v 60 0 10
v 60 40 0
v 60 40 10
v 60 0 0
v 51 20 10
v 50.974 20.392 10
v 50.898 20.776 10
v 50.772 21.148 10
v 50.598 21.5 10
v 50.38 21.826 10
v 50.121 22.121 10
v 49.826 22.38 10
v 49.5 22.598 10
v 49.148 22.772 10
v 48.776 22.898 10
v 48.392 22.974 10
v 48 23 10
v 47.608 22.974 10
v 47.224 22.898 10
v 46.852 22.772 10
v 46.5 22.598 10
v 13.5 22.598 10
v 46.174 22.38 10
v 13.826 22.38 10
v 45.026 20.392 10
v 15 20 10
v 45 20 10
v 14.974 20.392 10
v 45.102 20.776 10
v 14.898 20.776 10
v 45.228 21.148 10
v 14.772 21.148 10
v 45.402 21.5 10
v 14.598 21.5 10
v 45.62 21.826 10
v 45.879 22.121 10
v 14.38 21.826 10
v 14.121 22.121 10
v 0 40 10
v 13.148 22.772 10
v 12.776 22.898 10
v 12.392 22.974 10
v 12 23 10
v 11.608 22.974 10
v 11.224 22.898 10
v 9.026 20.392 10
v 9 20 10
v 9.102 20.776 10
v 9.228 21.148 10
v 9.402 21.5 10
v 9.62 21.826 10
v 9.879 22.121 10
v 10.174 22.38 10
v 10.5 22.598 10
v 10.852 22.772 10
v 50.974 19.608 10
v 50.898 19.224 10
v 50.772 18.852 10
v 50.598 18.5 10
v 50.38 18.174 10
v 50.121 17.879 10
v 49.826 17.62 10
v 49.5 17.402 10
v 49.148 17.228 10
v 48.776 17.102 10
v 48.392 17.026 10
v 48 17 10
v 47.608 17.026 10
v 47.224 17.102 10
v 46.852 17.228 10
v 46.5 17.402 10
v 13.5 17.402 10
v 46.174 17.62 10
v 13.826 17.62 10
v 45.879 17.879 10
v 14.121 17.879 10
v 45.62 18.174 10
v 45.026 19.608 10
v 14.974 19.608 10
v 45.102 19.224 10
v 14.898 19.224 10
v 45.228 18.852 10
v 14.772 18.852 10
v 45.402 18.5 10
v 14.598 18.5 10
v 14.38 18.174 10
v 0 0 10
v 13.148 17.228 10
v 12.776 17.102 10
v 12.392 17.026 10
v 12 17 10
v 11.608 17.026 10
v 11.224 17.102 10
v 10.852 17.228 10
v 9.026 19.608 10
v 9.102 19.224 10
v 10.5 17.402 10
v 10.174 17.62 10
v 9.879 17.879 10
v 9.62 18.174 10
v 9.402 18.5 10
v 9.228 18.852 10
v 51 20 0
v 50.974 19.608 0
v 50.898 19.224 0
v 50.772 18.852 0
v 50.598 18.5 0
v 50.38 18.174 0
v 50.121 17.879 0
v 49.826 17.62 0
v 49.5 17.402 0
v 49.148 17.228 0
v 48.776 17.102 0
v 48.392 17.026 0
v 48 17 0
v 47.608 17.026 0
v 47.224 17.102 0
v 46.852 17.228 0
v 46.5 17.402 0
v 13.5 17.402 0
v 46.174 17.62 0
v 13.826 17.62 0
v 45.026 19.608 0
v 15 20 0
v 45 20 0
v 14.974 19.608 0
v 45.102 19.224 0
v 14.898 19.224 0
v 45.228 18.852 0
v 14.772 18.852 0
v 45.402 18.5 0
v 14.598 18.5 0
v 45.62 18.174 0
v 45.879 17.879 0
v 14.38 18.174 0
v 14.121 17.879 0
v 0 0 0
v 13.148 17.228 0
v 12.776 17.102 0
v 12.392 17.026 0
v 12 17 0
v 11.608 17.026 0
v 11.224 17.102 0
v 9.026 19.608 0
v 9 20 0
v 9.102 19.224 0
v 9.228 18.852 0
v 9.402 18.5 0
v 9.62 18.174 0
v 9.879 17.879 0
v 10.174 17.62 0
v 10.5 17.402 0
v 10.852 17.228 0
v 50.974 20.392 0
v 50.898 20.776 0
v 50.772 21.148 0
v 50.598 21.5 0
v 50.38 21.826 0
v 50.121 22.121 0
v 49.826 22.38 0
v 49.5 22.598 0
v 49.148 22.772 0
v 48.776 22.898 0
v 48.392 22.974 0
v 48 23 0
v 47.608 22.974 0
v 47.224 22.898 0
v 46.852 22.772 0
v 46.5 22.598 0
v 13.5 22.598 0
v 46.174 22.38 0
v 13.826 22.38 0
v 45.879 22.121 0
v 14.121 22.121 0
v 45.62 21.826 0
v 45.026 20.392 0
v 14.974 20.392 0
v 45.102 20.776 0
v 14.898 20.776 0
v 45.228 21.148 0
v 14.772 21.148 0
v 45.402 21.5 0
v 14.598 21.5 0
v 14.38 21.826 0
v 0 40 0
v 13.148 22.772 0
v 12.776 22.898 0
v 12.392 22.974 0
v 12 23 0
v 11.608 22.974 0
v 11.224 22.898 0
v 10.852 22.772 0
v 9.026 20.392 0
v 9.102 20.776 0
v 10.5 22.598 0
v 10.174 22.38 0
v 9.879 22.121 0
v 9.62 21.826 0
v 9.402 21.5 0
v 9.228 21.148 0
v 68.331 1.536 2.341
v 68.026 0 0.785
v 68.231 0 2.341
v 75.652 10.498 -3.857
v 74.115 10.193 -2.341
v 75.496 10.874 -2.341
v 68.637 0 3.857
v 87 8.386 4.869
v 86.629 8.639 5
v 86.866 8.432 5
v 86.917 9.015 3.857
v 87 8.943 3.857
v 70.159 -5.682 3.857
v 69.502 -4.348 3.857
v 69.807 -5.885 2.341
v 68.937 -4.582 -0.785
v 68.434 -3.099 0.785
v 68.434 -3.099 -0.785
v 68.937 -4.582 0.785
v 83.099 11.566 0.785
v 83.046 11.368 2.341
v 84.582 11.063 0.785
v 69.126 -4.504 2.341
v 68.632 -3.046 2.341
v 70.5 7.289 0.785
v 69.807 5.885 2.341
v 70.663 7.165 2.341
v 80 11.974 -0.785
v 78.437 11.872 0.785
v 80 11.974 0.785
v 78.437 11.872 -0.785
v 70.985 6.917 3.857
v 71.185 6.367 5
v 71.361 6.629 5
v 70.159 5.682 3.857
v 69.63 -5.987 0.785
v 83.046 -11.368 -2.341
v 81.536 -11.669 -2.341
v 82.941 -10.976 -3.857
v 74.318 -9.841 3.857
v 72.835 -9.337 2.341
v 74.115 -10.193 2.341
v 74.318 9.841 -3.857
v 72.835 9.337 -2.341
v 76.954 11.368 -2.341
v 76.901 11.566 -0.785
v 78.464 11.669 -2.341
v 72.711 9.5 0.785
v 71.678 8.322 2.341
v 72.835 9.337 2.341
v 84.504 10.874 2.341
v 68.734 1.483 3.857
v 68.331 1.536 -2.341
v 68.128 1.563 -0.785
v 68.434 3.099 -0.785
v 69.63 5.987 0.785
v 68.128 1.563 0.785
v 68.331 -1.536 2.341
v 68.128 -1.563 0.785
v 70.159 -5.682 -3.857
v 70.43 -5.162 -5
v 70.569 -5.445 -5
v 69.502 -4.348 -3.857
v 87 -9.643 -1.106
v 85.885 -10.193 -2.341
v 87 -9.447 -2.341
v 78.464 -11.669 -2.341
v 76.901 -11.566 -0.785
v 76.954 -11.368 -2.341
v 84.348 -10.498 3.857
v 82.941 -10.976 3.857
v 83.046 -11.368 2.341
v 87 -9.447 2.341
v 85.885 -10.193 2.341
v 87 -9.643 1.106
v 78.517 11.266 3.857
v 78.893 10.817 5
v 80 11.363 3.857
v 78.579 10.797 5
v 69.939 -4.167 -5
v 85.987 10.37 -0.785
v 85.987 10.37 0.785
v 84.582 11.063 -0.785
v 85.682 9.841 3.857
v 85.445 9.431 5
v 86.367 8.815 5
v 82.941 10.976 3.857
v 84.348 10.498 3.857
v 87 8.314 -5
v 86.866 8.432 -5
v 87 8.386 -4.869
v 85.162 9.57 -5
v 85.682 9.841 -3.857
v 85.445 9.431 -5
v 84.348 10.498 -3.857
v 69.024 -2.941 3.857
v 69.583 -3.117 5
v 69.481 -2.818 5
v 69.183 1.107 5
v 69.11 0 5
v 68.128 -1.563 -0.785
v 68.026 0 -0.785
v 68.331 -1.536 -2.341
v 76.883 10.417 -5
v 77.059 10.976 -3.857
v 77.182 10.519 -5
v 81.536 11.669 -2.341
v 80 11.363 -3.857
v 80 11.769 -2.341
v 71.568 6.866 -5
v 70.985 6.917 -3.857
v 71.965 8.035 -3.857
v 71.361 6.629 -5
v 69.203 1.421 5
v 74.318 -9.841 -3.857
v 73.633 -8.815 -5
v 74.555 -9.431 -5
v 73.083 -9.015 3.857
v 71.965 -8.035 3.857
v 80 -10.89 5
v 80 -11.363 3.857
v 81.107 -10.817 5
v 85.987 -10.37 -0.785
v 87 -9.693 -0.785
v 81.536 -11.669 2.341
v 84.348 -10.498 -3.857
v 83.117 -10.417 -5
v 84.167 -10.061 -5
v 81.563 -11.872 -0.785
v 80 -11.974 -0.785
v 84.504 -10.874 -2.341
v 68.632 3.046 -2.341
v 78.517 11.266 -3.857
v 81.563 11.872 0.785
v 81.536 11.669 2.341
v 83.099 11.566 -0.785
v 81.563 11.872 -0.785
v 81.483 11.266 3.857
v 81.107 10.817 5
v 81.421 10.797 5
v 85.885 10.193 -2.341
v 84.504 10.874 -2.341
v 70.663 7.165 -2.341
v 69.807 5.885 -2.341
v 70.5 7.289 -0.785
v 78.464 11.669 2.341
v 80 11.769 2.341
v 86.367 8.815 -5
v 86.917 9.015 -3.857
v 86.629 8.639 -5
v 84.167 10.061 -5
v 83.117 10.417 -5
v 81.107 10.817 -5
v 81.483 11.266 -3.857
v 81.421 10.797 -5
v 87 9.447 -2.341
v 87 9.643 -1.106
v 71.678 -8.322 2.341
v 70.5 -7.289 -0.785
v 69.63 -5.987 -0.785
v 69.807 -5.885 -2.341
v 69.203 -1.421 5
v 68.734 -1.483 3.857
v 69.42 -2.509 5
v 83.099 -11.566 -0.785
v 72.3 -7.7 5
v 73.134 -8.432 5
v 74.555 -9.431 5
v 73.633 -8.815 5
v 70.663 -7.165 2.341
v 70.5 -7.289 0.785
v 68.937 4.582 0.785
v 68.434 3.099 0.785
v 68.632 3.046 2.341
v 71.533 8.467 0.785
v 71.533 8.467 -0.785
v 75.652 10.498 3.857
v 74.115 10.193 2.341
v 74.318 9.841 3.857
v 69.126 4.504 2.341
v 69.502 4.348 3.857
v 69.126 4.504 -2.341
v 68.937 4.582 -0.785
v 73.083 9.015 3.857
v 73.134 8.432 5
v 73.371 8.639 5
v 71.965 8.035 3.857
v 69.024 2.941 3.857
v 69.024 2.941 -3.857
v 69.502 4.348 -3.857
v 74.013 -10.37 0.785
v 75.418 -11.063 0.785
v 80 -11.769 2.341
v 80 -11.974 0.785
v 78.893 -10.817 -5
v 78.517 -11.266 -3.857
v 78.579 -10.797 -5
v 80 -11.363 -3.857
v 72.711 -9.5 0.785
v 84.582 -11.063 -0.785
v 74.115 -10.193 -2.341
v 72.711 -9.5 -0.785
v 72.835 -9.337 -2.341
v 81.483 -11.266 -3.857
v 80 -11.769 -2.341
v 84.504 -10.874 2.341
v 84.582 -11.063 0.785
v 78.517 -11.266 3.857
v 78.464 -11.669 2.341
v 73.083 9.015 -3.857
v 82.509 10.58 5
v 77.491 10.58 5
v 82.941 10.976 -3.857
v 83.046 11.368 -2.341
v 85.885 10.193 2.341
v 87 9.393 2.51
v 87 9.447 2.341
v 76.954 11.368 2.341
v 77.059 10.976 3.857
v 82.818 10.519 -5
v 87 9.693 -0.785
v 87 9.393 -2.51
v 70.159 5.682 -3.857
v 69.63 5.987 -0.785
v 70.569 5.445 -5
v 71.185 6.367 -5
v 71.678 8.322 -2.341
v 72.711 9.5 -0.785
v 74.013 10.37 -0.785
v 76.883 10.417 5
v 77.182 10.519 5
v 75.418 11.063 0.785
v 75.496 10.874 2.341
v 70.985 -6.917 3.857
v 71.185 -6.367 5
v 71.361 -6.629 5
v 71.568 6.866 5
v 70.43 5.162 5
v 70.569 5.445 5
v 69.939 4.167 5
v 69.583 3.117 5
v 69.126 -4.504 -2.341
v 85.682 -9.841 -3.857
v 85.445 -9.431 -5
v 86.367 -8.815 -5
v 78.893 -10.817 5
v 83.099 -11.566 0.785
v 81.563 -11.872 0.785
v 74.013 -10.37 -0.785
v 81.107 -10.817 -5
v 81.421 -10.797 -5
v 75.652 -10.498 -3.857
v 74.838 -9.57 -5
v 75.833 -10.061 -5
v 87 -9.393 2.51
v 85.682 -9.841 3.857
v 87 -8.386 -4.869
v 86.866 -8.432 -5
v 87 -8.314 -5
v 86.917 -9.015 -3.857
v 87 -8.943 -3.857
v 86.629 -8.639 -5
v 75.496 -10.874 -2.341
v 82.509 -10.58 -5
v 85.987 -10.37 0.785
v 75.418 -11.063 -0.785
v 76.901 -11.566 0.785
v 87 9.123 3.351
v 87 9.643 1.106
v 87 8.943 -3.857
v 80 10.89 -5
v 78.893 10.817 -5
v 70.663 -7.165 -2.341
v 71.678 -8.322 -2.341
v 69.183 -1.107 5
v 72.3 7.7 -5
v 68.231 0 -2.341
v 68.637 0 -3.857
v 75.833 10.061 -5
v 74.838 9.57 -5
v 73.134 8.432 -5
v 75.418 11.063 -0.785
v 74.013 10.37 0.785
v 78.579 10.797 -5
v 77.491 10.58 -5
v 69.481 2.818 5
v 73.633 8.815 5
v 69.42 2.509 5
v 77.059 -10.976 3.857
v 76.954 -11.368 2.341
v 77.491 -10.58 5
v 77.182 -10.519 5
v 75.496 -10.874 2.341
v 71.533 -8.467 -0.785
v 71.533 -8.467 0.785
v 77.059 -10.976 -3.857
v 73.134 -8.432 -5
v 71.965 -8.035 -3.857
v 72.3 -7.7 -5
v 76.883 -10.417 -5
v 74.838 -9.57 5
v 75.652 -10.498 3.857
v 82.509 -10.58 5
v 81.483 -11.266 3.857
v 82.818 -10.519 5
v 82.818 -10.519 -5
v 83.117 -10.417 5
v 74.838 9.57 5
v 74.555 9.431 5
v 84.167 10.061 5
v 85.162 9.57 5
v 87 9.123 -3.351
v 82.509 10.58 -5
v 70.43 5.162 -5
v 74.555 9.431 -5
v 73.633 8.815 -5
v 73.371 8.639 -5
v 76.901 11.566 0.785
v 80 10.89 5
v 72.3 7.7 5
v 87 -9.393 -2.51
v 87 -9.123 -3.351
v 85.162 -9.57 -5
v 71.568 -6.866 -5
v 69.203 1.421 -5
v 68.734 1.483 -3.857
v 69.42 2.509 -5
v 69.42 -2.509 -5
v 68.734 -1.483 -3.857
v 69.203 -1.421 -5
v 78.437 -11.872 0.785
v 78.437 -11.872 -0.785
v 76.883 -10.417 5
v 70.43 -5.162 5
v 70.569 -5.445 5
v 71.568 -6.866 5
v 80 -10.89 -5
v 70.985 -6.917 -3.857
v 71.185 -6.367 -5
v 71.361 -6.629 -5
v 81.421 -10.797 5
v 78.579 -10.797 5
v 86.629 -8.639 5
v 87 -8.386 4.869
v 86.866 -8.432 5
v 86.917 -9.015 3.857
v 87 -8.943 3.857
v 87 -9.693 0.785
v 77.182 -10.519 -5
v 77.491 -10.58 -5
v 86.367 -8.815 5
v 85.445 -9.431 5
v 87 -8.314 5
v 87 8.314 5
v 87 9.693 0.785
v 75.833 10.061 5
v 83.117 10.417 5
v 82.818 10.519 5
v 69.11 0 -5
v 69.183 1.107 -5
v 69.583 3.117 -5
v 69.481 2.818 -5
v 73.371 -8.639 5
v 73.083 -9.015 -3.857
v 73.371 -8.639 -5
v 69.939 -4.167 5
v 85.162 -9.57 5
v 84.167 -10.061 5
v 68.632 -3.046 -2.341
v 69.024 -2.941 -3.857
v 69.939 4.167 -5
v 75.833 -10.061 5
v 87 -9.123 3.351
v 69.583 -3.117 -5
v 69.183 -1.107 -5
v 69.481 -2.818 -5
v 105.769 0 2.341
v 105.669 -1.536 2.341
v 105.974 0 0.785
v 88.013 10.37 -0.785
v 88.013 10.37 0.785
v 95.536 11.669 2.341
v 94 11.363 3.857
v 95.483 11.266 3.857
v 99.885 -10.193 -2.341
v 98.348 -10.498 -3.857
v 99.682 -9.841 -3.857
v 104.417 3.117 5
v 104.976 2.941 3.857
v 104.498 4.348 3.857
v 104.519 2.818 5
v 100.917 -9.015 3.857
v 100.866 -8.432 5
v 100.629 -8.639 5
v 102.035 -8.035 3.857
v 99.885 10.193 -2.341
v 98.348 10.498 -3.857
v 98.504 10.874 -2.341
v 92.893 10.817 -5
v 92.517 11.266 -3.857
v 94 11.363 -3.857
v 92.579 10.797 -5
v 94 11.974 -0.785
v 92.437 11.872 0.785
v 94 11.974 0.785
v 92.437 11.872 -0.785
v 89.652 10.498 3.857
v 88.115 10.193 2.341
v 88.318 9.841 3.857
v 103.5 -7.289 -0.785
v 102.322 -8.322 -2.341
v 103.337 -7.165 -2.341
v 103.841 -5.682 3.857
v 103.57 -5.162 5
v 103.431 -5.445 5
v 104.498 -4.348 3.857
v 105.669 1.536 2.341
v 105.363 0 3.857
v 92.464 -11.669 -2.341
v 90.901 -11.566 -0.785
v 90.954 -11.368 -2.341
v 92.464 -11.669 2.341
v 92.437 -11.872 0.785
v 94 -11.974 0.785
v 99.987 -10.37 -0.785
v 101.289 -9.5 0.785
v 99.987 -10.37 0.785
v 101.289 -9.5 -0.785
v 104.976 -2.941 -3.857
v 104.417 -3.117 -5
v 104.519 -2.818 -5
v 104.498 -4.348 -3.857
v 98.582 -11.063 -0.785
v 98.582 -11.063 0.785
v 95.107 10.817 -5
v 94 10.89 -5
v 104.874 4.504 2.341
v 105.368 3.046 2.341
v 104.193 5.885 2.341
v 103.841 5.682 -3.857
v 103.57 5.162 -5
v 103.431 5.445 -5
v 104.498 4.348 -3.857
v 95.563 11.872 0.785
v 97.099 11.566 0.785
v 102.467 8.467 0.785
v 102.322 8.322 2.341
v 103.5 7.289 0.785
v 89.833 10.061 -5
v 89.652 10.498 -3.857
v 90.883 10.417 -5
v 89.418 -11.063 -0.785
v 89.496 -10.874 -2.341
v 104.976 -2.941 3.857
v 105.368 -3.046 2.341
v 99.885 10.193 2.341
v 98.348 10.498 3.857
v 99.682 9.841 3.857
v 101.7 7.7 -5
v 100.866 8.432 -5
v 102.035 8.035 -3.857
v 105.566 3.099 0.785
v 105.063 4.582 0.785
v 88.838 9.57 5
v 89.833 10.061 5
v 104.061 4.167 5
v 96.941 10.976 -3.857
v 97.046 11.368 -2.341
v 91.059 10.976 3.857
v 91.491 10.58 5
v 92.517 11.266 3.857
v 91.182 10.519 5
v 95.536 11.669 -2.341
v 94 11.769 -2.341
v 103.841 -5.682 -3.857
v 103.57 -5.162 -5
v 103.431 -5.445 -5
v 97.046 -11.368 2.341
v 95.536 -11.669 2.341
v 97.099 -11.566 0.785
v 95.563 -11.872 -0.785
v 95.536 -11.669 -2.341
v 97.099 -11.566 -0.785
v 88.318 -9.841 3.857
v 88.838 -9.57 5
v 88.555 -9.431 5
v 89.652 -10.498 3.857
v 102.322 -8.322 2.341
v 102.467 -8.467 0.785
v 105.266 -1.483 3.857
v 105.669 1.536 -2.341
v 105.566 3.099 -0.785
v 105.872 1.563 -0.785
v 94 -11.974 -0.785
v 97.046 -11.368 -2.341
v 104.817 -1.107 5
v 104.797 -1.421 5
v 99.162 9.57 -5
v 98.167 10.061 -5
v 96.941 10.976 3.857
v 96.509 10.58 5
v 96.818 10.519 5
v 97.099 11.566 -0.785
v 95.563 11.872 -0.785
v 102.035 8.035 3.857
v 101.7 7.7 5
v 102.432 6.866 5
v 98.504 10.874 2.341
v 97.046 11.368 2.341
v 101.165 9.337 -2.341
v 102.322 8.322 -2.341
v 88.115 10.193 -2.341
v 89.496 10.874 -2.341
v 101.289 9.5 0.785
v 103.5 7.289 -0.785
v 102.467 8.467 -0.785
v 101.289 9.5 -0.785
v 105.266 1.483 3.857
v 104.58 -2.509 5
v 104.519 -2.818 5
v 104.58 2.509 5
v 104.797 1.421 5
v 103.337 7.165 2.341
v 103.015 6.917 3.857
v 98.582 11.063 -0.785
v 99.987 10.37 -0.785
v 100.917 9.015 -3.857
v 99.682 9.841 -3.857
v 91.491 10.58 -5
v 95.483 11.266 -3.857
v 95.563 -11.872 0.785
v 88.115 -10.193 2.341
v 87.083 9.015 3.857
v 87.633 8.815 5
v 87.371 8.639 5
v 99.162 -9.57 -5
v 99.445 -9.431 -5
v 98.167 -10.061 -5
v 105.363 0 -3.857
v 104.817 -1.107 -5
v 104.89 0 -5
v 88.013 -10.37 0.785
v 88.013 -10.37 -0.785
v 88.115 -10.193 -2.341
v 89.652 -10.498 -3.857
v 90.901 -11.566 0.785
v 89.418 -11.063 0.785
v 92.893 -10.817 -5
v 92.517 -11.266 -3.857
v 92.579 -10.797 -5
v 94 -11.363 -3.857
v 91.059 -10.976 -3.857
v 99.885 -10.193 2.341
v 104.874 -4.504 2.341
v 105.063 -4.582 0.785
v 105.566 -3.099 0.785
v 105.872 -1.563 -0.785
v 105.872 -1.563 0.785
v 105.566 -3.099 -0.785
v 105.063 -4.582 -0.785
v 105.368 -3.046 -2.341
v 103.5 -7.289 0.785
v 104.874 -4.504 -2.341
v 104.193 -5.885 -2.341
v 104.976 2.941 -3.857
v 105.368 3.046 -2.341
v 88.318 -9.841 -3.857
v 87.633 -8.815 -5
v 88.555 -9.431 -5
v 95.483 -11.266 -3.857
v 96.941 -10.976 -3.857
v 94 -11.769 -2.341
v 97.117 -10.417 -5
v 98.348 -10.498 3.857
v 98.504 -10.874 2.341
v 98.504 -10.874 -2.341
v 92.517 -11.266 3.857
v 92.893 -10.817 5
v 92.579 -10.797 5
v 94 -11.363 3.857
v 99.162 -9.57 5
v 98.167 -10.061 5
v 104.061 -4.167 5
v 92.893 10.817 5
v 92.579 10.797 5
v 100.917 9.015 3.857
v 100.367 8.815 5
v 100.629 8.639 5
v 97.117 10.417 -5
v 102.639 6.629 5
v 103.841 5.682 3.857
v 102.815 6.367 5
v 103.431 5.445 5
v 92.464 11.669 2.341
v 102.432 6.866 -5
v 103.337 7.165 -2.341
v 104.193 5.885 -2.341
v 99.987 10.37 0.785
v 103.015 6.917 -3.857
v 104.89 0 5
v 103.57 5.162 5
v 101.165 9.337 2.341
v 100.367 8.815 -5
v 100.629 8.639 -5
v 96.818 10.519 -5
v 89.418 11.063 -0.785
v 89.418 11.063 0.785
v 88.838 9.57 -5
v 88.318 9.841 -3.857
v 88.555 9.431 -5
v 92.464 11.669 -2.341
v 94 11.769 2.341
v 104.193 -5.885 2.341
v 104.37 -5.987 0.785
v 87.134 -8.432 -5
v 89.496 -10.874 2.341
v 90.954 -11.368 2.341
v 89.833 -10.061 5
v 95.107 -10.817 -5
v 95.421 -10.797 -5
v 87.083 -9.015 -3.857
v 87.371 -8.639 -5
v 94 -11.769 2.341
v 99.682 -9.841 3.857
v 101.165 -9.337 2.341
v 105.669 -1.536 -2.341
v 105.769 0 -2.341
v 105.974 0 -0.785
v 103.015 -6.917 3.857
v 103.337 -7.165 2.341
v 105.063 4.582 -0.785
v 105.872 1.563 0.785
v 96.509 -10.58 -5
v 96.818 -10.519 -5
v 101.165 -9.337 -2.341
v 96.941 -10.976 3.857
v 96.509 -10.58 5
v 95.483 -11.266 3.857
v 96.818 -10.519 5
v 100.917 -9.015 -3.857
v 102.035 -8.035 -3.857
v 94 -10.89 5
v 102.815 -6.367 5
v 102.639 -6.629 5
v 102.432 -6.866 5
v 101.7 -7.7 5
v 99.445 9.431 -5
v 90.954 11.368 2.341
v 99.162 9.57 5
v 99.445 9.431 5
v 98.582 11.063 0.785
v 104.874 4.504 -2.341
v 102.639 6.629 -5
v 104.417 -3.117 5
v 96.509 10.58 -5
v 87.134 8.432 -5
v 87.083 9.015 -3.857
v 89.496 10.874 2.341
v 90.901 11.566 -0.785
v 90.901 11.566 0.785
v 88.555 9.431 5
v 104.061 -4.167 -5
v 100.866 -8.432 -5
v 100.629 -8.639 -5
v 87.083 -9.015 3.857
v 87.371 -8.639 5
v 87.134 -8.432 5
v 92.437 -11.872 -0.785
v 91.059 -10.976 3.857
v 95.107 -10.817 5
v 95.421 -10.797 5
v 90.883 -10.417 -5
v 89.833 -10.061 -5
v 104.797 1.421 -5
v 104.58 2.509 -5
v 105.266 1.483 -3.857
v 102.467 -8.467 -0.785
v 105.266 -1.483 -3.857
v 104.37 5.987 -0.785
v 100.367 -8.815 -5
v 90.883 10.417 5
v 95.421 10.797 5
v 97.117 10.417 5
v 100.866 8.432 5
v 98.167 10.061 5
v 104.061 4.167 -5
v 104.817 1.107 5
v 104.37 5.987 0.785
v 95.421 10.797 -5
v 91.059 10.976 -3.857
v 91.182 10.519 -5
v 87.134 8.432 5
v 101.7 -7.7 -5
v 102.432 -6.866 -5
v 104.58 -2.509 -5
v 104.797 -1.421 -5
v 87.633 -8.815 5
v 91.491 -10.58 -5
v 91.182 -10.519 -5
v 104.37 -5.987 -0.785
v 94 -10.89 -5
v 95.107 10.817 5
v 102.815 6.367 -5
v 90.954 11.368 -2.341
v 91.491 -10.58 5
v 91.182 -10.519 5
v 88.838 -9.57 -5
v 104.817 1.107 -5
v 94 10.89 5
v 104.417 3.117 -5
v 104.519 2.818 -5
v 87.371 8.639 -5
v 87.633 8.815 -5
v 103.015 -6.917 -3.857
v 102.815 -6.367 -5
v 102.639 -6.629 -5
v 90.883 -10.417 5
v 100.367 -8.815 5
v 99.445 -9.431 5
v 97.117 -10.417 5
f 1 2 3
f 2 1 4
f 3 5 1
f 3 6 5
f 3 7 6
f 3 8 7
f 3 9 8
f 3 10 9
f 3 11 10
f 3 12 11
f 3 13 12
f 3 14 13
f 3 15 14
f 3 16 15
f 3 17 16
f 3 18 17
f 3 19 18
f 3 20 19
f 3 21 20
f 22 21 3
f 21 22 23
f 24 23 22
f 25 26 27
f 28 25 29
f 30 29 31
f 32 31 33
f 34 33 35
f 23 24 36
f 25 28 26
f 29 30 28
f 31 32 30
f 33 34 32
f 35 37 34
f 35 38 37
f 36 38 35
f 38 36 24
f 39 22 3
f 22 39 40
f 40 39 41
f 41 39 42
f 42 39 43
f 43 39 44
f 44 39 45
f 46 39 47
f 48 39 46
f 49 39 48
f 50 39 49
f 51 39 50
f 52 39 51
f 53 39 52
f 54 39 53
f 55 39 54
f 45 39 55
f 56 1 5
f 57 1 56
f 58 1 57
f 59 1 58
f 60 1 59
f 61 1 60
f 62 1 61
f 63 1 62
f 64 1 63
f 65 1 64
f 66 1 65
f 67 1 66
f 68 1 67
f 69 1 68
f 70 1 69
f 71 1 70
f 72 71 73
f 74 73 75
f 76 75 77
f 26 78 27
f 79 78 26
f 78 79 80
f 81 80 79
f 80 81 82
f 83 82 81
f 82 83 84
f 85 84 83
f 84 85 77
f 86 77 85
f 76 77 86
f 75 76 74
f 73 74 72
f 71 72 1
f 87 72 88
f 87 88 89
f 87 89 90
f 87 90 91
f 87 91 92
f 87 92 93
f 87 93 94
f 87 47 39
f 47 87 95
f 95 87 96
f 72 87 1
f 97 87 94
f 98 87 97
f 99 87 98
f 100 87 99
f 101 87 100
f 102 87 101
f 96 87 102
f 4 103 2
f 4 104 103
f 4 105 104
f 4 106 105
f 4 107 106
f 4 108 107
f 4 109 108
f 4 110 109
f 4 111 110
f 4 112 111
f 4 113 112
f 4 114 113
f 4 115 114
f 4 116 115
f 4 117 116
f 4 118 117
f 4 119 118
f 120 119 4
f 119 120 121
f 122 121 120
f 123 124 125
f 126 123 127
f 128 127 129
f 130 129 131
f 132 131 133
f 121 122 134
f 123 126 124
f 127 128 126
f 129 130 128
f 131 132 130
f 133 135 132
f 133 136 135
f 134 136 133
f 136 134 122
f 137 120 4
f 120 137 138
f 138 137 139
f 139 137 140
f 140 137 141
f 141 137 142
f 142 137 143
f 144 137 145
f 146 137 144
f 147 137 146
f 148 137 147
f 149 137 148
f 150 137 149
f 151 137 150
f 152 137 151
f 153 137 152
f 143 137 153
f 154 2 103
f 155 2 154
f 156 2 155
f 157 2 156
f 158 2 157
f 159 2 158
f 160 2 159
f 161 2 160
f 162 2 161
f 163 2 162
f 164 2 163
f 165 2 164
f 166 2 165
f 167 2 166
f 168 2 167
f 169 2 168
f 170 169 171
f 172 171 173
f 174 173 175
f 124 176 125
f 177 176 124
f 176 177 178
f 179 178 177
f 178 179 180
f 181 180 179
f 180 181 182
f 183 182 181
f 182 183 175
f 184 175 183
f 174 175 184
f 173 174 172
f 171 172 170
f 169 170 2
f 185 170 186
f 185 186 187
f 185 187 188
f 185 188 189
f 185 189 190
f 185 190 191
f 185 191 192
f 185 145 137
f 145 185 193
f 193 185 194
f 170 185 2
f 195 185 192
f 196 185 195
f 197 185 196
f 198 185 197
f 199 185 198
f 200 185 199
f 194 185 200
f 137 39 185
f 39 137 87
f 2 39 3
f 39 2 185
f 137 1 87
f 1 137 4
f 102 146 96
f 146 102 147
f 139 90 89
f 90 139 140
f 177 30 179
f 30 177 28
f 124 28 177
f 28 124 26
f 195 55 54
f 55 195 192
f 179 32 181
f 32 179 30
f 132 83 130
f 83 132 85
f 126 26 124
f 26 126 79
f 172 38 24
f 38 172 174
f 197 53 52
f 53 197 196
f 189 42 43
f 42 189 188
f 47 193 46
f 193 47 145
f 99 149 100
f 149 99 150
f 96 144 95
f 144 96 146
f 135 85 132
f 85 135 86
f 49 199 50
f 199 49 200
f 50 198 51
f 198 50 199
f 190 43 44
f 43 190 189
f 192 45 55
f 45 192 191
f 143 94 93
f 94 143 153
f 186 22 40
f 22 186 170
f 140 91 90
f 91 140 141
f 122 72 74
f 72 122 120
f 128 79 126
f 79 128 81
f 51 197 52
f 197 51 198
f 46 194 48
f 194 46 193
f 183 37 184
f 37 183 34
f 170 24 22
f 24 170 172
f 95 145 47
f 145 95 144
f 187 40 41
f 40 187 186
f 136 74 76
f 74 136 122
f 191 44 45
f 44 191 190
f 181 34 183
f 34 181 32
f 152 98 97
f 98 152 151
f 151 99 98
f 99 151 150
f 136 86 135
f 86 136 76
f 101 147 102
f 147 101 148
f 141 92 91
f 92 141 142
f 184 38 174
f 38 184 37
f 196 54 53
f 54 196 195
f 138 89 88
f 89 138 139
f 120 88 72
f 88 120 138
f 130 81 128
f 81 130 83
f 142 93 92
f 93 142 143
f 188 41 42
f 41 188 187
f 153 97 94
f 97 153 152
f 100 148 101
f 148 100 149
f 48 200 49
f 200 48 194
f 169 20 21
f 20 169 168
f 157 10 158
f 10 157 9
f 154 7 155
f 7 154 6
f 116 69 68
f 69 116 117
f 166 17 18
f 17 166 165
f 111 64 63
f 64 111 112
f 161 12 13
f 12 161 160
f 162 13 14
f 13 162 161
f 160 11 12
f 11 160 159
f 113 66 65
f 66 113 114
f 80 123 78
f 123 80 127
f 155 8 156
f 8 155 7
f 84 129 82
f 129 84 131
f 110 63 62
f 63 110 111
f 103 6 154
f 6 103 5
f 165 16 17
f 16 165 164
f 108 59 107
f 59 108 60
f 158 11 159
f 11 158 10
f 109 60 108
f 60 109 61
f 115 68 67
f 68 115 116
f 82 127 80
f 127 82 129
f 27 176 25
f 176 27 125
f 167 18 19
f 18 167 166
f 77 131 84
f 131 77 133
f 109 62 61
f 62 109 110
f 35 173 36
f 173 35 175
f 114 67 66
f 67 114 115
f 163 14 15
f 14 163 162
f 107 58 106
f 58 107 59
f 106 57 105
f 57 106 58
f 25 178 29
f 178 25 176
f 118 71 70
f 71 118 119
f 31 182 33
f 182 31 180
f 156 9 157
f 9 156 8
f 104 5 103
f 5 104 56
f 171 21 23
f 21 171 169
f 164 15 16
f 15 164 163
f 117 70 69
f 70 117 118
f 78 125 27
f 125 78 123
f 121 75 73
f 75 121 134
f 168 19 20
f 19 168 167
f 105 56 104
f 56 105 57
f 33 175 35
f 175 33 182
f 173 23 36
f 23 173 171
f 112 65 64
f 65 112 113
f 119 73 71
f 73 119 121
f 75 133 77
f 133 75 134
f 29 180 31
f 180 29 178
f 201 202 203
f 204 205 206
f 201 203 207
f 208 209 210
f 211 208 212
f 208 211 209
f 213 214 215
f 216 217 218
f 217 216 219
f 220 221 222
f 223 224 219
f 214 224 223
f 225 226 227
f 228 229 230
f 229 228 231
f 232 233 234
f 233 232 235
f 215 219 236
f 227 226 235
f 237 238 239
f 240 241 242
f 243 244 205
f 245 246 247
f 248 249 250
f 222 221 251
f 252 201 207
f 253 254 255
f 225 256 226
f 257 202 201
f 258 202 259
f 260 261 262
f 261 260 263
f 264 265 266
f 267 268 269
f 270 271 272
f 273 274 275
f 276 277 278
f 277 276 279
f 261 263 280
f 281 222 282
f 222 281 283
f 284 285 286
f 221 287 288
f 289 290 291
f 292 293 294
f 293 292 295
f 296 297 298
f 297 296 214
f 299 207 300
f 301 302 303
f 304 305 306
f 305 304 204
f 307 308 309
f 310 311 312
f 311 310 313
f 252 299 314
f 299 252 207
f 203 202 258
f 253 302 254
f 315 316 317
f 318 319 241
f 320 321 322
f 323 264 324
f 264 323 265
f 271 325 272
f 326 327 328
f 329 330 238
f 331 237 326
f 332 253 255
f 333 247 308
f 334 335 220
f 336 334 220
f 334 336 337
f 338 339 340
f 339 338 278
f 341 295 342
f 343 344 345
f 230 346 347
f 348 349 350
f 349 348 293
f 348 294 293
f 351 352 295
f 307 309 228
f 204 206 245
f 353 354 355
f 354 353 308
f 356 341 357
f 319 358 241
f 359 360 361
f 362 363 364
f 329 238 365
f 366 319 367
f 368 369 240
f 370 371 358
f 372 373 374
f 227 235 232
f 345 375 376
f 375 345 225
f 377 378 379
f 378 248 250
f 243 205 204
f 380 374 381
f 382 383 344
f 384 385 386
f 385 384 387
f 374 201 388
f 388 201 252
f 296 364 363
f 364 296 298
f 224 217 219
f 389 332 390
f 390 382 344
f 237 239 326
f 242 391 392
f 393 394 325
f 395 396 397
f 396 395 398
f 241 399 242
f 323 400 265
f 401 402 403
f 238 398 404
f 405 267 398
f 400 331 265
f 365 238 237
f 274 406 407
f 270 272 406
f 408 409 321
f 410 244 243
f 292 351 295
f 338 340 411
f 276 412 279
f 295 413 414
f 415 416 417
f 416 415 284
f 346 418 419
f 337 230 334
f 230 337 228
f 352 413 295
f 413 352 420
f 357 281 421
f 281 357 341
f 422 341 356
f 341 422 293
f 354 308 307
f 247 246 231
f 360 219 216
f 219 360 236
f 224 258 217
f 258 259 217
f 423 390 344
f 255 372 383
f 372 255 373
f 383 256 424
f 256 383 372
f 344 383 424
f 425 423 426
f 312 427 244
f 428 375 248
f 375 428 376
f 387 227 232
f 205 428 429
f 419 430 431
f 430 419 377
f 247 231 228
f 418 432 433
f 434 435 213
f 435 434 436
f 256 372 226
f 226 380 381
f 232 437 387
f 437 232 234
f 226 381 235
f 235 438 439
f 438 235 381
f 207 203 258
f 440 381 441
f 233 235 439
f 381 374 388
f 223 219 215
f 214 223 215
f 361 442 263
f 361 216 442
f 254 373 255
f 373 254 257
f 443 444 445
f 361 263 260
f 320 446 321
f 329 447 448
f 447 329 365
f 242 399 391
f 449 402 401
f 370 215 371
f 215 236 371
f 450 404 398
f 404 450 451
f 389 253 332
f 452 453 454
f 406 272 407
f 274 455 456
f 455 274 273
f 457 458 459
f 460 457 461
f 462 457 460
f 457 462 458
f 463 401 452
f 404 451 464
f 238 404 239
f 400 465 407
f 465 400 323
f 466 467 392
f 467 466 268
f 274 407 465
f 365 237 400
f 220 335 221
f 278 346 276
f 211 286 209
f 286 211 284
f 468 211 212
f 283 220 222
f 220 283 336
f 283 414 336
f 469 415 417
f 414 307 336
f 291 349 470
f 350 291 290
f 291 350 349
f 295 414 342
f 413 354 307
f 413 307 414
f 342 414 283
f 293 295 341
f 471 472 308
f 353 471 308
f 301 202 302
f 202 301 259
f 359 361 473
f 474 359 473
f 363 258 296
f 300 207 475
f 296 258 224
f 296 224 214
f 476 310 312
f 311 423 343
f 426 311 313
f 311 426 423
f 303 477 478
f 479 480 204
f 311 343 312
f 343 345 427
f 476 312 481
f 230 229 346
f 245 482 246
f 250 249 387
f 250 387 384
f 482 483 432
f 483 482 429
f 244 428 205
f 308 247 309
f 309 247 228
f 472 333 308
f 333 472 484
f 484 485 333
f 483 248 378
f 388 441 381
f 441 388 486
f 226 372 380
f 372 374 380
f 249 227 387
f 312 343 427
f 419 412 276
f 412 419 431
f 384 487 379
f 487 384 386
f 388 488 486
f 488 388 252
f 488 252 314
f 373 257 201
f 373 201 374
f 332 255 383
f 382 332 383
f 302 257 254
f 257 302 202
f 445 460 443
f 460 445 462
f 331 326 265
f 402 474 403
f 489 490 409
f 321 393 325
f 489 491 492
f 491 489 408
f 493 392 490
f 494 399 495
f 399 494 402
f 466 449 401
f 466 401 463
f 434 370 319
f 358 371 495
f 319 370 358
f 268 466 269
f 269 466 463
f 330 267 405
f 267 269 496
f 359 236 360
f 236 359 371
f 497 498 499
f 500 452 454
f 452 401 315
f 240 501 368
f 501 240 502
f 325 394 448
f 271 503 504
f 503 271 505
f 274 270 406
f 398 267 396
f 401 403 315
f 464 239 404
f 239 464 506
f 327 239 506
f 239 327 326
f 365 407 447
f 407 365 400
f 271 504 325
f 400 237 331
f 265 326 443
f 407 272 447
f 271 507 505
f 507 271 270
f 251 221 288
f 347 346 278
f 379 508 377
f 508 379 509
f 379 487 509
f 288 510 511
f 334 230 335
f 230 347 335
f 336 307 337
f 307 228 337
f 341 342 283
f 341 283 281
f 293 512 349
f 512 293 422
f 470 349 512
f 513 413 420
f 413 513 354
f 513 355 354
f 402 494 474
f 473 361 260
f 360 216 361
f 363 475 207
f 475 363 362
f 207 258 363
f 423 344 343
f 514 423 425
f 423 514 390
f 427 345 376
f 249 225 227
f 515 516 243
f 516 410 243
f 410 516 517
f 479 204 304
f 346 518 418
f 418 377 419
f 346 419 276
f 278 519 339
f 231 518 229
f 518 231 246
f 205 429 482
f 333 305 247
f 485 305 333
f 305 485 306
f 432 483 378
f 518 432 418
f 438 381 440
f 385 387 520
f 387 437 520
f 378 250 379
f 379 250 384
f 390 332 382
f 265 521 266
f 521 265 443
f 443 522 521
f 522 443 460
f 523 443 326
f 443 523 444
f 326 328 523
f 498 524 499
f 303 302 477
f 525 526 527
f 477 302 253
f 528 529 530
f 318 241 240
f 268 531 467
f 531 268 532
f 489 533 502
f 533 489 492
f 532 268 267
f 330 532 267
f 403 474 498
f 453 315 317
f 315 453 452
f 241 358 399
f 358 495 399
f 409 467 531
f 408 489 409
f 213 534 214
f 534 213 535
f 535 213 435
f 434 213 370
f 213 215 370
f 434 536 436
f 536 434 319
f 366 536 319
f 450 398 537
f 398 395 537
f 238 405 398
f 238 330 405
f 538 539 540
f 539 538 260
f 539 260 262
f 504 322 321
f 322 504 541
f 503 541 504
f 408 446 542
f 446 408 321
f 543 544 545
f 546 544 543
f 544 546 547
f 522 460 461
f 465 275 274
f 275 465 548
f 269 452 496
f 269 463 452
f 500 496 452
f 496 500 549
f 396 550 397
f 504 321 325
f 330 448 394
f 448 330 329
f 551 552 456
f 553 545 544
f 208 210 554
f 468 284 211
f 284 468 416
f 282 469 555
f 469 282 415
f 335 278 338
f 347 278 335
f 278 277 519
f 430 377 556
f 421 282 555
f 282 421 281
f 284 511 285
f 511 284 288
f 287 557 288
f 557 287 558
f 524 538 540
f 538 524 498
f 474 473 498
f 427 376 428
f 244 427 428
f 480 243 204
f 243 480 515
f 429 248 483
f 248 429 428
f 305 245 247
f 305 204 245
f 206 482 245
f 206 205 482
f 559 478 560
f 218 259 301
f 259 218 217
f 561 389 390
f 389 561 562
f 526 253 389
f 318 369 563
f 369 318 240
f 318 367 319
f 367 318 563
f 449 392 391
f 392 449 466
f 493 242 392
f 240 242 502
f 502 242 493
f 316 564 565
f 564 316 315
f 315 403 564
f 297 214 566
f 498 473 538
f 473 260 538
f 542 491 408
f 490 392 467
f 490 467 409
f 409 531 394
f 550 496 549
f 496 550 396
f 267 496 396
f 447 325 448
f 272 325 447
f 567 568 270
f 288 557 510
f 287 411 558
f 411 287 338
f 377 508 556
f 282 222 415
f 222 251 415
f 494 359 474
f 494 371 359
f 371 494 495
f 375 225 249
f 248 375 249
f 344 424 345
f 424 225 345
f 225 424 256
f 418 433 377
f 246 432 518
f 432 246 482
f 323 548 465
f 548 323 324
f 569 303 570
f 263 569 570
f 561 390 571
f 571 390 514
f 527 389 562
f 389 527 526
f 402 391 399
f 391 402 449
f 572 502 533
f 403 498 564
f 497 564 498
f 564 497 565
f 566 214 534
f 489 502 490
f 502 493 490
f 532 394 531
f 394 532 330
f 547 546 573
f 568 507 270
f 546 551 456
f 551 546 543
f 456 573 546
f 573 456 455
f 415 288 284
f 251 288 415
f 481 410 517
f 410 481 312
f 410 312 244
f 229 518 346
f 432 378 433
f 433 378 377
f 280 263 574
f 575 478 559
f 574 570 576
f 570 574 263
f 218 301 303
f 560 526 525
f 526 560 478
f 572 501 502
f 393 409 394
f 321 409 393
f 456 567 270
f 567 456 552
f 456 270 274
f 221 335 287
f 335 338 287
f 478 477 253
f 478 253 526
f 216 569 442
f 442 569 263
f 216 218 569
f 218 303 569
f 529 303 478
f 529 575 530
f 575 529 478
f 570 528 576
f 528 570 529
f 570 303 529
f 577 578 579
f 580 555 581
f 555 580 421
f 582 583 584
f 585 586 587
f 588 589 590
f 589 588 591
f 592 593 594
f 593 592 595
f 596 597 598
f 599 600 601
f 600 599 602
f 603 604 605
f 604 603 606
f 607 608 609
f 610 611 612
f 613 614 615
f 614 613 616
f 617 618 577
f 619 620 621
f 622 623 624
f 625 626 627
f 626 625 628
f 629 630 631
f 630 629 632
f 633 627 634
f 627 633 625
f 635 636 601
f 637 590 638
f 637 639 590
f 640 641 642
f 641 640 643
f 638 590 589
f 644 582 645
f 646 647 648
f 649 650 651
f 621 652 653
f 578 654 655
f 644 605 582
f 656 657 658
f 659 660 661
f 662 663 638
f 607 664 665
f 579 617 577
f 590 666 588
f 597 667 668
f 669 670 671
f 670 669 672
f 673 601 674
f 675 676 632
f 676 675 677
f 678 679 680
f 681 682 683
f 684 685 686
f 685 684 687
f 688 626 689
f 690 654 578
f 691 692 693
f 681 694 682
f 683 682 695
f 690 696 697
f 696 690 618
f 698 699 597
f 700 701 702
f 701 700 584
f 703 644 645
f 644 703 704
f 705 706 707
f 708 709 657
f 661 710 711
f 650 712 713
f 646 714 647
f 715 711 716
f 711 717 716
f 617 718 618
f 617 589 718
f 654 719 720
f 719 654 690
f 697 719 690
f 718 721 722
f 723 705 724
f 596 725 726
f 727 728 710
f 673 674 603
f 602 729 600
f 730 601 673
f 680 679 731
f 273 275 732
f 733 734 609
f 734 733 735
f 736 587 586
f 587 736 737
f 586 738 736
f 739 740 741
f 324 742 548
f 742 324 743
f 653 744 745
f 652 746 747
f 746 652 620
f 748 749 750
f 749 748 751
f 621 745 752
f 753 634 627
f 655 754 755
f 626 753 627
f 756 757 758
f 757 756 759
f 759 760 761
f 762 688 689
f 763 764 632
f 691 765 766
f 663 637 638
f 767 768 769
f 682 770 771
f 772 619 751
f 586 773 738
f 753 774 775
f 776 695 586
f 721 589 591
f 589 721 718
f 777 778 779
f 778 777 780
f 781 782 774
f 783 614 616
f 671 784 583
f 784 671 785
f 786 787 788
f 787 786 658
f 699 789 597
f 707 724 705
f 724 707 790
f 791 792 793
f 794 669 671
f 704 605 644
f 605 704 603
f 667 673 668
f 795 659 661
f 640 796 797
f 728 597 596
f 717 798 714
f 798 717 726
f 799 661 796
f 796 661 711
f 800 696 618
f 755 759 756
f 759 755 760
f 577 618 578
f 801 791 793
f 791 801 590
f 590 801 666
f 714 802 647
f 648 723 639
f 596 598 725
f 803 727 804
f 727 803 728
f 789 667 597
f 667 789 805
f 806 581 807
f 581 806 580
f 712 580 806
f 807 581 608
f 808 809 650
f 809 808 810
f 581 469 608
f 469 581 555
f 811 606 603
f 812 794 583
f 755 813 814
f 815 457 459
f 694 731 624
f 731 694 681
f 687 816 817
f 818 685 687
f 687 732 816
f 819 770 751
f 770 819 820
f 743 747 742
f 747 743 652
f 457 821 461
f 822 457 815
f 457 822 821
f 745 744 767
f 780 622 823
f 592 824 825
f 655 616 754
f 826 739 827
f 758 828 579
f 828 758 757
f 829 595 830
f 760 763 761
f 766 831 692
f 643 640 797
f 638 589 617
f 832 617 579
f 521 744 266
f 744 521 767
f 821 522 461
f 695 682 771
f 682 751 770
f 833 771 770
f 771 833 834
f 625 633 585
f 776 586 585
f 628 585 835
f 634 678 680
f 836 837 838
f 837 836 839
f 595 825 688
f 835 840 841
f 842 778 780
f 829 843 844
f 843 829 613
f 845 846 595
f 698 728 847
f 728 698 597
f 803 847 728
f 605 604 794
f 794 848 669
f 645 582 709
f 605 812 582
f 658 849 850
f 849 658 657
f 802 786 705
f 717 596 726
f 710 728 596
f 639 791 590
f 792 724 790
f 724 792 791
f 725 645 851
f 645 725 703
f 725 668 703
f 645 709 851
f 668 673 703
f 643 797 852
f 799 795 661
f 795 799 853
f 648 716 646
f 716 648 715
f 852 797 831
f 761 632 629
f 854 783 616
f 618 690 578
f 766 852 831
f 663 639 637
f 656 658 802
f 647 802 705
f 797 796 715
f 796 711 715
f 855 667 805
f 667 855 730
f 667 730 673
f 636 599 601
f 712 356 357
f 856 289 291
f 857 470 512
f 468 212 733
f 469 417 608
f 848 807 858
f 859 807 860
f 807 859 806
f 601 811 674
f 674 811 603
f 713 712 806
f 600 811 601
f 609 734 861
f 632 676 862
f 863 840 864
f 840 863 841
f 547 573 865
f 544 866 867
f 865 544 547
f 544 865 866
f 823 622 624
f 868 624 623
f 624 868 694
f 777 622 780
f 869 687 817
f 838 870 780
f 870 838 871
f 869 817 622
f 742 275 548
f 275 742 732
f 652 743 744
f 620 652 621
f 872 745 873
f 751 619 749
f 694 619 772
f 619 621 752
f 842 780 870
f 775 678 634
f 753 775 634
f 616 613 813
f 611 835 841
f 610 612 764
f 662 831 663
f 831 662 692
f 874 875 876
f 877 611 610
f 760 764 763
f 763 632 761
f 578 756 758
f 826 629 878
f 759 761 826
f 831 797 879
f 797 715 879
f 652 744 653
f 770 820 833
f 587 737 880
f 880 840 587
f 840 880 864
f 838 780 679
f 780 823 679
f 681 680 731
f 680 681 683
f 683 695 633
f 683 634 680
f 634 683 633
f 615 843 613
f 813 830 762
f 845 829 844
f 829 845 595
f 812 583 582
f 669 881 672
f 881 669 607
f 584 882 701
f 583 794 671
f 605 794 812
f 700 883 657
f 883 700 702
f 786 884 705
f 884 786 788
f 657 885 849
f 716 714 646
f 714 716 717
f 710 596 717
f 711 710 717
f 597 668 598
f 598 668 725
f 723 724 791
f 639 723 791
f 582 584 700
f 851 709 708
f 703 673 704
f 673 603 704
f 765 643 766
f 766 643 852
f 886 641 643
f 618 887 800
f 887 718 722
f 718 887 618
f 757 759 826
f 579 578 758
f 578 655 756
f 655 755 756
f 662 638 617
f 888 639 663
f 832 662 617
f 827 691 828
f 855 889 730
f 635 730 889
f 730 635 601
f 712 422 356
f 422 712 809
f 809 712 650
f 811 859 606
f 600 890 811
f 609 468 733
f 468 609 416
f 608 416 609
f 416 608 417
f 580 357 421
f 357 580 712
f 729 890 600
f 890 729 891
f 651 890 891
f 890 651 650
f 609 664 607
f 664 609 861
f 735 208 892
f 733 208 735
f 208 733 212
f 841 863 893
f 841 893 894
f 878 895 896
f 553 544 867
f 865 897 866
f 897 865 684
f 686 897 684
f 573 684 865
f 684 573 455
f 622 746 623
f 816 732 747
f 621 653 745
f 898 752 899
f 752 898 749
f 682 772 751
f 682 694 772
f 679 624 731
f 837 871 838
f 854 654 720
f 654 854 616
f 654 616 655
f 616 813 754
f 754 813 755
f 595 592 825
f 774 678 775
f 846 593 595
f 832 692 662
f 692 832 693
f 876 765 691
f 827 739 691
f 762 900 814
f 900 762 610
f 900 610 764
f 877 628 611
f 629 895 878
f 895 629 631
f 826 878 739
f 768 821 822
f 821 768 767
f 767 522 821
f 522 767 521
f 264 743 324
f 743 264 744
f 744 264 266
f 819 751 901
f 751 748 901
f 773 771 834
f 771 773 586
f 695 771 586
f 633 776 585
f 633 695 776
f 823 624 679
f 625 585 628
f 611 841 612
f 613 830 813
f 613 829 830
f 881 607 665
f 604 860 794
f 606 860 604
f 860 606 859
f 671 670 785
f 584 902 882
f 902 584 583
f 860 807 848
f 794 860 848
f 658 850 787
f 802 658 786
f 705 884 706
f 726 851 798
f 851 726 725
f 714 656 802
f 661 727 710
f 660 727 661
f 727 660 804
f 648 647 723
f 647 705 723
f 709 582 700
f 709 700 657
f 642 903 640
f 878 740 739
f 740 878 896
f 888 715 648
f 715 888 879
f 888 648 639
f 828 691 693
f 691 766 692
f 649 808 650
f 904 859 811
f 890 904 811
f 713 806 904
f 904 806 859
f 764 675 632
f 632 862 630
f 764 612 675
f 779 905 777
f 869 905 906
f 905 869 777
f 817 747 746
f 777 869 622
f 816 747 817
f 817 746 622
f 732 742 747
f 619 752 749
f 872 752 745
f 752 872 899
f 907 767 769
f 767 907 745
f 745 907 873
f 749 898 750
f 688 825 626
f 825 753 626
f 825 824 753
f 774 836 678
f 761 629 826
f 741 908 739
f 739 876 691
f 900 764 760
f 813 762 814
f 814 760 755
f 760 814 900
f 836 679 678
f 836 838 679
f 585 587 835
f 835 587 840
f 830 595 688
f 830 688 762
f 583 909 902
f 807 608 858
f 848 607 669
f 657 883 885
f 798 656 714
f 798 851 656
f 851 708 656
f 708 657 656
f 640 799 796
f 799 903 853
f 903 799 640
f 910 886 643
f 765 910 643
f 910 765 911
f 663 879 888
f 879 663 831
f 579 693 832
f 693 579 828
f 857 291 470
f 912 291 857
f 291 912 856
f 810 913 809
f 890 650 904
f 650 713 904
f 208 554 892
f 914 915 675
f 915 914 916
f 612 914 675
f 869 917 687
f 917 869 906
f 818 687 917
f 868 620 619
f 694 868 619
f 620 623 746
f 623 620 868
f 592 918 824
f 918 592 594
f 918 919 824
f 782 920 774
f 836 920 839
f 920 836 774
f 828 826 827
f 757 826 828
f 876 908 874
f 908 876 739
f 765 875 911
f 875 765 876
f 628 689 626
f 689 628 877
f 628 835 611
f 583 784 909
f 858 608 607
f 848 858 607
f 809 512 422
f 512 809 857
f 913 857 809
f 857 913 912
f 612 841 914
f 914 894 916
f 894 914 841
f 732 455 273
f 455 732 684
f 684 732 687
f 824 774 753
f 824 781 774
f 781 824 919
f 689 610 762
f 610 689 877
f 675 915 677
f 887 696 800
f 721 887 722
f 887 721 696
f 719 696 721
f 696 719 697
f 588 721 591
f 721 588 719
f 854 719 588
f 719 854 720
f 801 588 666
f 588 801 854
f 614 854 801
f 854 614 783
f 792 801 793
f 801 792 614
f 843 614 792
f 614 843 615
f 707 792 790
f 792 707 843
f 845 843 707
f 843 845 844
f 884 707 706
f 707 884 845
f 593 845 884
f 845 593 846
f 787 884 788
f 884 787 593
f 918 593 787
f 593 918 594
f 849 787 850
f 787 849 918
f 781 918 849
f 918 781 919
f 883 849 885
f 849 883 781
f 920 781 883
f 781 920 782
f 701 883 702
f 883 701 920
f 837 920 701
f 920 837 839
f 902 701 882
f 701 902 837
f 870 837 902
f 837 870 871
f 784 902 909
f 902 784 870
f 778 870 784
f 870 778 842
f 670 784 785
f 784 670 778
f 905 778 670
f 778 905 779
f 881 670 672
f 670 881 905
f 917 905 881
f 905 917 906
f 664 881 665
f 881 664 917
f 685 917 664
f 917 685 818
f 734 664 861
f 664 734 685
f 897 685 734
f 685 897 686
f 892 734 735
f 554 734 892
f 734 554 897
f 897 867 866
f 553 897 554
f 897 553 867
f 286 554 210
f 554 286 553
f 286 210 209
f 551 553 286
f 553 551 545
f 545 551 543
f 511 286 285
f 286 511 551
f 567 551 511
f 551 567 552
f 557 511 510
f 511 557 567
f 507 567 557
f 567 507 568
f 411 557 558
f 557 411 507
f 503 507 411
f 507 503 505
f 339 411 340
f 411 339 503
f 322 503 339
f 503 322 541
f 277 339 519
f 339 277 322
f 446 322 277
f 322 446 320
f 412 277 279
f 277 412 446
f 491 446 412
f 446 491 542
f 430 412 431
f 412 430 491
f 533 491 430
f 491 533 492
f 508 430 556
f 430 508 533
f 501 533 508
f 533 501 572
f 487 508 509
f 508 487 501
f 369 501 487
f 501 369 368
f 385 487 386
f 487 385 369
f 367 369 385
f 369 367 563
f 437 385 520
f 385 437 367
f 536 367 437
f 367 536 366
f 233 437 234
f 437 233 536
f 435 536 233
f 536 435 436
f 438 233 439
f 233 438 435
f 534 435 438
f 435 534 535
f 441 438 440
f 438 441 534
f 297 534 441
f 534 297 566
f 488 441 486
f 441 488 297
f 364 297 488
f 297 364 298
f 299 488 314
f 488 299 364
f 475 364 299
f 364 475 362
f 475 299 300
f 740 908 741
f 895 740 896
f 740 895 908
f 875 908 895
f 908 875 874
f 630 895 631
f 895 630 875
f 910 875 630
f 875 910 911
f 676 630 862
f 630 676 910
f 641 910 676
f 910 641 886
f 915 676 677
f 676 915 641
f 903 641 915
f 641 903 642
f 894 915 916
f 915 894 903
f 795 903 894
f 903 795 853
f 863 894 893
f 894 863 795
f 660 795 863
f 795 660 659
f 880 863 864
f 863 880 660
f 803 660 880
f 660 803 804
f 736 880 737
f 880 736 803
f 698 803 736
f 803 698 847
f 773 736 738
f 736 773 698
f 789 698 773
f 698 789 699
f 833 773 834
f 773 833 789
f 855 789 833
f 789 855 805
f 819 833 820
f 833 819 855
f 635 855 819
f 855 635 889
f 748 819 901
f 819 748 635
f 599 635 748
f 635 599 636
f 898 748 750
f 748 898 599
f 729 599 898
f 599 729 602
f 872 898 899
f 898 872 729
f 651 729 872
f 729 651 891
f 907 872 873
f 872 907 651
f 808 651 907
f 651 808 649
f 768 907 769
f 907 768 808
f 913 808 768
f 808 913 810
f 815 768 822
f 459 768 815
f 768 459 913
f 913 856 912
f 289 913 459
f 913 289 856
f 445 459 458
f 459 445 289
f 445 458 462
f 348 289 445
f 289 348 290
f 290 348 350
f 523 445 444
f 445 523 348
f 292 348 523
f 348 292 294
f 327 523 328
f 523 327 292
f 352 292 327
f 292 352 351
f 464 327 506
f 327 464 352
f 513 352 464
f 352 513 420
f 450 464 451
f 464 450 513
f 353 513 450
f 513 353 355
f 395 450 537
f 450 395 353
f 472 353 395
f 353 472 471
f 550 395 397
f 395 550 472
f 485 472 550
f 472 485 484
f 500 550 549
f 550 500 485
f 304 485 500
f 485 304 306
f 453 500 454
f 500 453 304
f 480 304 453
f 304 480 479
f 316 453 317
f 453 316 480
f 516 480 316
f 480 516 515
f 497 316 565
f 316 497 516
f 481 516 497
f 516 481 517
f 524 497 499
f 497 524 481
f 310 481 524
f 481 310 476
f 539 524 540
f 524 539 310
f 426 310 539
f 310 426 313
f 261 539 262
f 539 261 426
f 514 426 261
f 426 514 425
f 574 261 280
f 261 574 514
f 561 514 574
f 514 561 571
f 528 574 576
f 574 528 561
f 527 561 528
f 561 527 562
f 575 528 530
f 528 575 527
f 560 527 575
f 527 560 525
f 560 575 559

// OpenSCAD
// booleans.scad — adding and cutting solids.
// union()        keep everything from every shape
// difference()   first shape minus all the shapes after it
// intersection() keep only where all shapes overlap

$fn = 48;

// A mounting plate with two bolt holes: a box, minus two
// cylinders. The cutters stick out above and below the
// plate (z from -1 to 11 for a 10-thick plate) so the
// holes cut cleanly — chapter 4 explains why.
difference() {
    cube([60, 40, 10]);
    translate([12, 20, -1])
        cylinder(h = 12, r = 3);
    translate([48, 20, -1])
        cylinder(h = 12, r = 3);
}

// Beside it, everything at once: two overlapping balls
// fused by union, then intersected with a slab so only
// the shared lens inside the slab survives.
translate([80, 0, 0])
    intersection() {
        union() {
            sphere(r = 12);
            translate([14, 0, 0])
                sphere(r = 12);
        }
        translate([-14, -14, -5])
            cube([56, 28, 10]);
    }
